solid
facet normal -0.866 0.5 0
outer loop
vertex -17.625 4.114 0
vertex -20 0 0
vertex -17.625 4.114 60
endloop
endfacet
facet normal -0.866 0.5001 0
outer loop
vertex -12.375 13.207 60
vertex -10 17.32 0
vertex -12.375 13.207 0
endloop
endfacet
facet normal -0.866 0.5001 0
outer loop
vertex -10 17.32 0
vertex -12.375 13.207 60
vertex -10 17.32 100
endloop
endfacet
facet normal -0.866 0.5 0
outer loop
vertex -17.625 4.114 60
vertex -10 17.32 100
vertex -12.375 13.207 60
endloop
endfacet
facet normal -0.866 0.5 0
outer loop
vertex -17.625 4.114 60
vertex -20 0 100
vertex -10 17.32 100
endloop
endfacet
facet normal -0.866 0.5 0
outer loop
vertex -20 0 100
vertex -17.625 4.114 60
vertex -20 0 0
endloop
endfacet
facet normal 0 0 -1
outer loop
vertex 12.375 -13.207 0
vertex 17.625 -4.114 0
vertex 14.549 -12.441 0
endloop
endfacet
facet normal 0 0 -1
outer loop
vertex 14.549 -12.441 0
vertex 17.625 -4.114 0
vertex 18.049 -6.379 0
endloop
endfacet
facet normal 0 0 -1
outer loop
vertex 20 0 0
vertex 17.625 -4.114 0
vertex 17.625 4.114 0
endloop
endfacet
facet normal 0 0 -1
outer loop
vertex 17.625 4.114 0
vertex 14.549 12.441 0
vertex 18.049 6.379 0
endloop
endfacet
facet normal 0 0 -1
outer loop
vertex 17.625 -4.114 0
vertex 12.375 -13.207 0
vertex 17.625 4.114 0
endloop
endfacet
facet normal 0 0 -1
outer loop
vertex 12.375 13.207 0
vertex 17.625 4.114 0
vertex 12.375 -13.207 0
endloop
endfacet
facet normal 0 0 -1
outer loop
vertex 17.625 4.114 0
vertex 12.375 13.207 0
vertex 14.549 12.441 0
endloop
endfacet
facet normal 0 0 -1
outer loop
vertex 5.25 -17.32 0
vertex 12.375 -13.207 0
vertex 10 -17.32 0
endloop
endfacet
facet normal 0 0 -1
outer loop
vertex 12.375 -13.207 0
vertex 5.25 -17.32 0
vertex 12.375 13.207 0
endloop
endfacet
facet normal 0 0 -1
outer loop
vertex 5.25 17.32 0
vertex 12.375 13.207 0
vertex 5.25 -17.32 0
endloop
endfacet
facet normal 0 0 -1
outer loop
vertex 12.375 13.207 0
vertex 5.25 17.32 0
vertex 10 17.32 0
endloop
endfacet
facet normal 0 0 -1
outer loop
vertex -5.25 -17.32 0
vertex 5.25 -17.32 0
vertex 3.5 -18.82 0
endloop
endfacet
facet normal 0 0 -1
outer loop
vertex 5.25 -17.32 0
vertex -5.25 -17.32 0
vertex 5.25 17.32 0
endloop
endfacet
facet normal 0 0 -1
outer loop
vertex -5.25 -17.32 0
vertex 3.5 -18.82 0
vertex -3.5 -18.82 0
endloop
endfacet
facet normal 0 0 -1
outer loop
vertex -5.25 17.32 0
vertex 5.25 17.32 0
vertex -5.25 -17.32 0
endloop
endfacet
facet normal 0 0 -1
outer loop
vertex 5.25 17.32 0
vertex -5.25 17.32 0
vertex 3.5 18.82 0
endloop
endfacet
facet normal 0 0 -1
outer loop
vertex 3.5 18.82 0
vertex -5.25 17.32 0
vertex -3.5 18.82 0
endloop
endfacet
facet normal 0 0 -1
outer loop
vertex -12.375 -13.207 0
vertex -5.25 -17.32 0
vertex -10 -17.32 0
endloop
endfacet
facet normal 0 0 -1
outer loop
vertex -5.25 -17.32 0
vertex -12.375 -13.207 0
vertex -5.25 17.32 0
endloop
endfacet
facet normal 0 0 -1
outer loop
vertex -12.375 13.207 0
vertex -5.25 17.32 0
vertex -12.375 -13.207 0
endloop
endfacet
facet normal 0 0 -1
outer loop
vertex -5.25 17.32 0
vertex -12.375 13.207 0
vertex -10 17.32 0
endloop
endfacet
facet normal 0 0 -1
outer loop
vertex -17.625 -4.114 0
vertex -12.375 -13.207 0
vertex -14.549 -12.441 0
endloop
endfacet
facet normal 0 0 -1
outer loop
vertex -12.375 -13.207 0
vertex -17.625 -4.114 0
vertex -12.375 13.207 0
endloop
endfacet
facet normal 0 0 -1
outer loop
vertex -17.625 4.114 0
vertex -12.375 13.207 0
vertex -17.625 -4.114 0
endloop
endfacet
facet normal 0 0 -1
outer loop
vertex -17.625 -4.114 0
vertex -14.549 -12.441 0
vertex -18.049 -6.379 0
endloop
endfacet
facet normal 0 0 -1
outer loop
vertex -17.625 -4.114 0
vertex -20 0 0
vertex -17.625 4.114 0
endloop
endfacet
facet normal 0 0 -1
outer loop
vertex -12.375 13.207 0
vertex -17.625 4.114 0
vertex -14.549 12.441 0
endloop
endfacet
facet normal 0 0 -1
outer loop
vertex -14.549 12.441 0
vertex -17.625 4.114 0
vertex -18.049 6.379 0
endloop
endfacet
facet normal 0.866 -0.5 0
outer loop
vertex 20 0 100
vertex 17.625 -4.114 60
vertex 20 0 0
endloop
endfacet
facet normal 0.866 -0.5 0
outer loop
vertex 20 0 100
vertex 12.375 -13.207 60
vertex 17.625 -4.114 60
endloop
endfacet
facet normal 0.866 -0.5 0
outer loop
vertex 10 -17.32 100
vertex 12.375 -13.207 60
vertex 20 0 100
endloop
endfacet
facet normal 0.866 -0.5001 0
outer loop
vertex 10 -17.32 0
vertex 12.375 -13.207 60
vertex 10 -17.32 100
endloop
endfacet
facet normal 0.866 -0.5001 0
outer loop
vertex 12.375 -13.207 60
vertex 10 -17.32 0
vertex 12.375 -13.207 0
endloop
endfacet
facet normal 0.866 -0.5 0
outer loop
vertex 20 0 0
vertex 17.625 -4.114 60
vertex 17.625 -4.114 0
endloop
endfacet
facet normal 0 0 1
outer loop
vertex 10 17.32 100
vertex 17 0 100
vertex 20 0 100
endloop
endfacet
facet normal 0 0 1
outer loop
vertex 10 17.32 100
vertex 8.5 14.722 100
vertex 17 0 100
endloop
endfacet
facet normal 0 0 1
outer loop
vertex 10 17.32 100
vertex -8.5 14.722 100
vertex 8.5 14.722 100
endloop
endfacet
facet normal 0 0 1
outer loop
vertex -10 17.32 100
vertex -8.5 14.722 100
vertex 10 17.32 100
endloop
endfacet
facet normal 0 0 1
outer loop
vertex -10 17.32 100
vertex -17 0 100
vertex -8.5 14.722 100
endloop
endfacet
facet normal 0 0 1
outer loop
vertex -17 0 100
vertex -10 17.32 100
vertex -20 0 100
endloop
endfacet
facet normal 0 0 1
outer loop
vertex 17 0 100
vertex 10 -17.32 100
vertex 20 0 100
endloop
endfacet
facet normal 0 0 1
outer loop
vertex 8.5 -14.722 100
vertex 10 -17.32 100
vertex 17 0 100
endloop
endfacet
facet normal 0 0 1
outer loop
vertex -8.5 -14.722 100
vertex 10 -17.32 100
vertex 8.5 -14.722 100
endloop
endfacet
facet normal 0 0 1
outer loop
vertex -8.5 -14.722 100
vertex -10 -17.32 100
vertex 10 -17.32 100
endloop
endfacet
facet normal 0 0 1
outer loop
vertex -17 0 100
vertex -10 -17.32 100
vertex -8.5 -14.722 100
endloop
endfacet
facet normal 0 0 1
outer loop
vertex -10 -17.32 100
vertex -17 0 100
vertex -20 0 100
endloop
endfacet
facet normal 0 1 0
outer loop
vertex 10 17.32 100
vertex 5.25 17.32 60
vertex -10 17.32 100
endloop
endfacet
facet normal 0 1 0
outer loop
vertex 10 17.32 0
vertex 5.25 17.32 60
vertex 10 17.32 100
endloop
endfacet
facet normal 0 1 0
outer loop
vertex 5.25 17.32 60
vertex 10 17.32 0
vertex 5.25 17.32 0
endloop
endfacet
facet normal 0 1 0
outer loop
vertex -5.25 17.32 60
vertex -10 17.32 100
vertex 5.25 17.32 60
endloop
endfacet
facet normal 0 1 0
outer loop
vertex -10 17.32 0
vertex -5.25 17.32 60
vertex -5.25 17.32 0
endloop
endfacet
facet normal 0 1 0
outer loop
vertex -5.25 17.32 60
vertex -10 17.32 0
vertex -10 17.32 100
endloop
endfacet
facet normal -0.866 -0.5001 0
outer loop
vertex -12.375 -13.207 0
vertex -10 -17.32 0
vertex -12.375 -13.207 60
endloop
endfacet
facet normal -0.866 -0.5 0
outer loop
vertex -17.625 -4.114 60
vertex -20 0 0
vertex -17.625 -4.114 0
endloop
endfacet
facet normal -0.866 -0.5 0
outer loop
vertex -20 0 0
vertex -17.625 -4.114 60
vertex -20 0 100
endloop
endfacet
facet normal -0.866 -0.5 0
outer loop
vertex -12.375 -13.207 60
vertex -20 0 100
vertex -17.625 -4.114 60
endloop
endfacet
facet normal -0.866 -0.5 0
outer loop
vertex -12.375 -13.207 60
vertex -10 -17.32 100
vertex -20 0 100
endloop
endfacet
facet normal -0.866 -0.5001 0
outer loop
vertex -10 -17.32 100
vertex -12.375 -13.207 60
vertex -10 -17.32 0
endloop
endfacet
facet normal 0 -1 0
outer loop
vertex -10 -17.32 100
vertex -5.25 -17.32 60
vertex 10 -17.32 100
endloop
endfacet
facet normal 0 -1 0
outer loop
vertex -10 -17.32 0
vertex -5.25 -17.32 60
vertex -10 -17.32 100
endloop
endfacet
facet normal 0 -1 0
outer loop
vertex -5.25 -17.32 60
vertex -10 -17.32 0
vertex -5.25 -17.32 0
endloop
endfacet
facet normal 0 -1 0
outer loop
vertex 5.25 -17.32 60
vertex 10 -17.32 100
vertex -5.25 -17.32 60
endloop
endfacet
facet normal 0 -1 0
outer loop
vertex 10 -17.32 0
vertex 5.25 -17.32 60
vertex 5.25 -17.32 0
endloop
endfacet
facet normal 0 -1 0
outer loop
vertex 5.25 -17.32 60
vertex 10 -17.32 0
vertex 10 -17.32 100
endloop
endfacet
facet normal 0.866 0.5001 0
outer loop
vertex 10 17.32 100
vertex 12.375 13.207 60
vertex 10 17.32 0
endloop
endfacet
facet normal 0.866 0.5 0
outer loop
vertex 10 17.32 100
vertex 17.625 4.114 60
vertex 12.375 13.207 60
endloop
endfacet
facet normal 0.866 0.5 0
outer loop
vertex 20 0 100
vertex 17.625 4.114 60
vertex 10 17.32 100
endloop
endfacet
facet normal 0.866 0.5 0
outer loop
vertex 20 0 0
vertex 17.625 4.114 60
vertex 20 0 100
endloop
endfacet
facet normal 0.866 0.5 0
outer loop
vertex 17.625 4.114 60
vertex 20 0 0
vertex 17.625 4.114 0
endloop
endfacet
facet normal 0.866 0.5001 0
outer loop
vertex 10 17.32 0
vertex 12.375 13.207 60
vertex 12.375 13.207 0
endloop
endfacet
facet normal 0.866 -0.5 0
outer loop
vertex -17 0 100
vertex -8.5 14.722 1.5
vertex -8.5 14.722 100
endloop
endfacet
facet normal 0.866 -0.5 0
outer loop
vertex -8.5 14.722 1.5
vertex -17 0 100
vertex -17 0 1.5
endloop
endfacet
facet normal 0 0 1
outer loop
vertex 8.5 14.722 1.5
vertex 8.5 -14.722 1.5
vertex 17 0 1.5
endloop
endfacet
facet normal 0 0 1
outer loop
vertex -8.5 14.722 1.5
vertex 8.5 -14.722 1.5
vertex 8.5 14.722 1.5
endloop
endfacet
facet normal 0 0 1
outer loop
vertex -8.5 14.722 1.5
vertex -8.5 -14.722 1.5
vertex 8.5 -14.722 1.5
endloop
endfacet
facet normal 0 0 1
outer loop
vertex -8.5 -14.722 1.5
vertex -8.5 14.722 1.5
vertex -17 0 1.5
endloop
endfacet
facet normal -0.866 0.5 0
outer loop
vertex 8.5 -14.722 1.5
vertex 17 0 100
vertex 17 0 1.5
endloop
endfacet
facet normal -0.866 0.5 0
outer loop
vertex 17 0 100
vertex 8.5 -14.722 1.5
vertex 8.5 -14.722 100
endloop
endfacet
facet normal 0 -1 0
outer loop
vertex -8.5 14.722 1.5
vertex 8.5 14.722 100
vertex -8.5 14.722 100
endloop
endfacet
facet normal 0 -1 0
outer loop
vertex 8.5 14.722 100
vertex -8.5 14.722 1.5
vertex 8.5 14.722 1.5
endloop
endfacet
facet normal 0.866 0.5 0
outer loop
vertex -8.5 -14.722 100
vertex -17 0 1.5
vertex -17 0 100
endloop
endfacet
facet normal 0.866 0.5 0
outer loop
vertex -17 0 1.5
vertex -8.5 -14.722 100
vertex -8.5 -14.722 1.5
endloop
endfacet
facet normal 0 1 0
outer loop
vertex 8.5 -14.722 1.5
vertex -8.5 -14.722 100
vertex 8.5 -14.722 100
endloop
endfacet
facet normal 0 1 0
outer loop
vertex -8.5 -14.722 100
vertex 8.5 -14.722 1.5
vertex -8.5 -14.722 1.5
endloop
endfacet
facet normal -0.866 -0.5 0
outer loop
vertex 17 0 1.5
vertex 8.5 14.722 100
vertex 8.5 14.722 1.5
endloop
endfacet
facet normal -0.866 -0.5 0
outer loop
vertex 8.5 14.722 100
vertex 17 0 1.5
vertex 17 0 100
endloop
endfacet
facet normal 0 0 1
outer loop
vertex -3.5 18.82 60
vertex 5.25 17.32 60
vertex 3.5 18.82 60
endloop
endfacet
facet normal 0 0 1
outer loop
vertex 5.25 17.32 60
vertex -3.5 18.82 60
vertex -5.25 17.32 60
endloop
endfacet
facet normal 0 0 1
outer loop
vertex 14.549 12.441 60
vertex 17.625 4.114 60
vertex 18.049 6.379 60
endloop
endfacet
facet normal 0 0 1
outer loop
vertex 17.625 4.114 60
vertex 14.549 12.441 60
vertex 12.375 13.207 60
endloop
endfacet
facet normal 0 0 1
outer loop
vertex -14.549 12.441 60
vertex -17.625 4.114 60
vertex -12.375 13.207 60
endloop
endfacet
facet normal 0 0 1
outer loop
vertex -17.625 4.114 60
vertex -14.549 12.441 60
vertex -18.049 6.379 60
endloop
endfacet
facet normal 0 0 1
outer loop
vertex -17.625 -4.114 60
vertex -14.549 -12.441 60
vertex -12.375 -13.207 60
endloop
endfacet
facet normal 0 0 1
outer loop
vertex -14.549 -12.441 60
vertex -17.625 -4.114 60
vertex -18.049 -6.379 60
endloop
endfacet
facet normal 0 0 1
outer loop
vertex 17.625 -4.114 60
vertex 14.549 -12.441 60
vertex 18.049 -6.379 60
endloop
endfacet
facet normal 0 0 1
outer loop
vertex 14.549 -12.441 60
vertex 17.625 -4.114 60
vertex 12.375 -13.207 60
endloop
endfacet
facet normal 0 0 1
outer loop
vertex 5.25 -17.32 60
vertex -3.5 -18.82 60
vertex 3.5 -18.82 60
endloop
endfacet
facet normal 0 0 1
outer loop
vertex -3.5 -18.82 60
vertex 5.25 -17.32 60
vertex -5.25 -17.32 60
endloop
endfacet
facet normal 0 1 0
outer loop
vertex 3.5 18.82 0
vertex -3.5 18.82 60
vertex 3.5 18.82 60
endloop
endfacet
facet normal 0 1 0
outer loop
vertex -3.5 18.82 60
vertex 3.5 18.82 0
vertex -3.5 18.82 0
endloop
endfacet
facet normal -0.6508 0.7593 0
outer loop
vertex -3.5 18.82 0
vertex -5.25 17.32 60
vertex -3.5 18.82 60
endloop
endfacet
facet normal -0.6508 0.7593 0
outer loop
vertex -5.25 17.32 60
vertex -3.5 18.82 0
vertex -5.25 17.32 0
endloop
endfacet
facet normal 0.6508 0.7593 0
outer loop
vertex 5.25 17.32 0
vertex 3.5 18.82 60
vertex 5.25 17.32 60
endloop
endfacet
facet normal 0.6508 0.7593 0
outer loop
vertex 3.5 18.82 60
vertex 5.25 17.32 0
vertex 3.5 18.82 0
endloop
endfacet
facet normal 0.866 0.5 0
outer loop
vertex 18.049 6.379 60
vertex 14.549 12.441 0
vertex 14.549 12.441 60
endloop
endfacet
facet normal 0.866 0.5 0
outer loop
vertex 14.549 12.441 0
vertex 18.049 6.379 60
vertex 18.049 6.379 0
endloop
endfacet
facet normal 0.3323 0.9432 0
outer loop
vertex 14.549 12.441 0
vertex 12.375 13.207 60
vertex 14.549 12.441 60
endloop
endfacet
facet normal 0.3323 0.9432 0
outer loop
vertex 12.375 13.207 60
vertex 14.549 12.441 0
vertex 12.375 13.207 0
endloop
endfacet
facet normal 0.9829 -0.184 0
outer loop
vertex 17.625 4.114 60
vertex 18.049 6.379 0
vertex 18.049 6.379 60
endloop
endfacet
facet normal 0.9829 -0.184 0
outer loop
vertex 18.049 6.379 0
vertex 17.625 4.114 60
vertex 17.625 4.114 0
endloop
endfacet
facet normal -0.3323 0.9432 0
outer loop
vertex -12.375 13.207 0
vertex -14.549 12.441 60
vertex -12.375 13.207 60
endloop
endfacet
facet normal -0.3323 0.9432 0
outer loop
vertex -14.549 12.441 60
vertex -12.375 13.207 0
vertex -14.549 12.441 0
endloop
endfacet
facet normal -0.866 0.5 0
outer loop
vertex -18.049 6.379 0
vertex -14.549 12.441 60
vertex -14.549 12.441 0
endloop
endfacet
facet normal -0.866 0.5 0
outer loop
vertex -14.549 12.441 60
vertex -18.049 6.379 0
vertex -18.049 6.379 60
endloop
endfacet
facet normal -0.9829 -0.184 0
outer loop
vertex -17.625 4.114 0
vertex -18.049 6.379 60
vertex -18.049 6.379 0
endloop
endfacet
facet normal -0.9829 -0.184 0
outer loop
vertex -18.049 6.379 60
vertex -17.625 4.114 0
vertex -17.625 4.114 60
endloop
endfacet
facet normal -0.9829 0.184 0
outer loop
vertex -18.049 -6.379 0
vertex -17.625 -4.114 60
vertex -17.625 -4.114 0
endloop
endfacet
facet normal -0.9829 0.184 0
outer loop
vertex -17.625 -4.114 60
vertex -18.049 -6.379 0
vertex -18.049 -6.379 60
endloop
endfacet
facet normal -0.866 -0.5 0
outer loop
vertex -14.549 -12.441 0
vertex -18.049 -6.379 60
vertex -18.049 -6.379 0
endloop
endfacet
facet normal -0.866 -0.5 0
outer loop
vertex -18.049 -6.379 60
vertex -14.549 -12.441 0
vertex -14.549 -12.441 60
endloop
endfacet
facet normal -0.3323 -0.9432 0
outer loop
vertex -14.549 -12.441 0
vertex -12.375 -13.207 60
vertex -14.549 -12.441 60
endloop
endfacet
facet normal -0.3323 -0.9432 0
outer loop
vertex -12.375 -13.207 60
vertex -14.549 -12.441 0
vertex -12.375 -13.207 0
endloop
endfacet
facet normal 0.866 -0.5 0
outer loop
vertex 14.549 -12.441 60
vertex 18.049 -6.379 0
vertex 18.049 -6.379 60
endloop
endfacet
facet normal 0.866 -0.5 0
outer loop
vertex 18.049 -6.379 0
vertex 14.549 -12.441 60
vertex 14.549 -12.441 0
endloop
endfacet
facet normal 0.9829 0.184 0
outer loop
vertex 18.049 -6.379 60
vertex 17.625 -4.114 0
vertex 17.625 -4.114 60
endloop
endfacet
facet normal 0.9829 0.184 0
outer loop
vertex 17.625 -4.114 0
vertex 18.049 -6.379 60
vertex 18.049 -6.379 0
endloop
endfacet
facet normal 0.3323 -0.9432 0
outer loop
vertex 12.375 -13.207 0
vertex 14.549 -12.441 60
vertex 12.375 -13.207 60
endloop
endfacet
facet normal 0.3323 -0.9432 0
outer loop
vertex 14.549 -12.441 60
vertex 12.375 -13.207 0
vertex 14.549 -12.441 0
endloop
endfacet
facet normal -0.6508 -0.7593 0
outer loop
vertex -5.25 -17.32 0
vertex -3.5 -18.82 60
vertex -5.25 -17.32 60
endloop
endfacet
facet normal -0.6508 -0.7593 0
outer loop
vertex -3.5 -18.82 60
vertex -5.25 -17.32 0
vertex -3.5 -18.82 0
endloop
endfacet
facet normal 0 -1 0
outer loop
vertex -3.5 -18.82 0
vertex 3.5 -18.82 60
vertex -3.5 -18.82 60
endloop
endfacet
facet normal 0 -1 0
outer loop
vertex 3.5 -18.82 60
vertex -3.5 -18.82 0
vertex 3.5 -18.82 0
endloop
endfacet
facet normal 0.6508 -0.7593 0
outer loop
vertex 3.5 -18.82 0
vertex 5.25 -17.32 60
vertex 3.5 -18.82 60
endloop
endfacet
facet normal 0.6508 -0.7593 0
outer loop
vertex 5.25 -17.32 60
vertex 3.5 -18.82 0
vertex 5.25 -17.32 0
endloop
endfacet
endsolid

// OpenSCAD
module trapezoid(b, t, h) {
    polygon(points=[
        [-b/2, -h/2],
        [+b/2, -h/2],
        [+t/2, +h/2],
        [-t/2, +h/2]
    ]);
}

module hexagon(side) {
    r = side;  // for a regular hexagon
    points = [for (i = [0:5]) [r * cos(i * 60), r * sin(i * 60)]];
    polygon(points);
}

// Put trapezoid on each side of a hexagon
module hex_with_trapezoids(hex_side, trap_base, trap_top, trap_height) {
    r = hex_side;  // For regular hexagon: side = radius to vertex
    points = [for (i = [0:5]) [r * cos(i * 60), r * sin(i * 60)]];

    for (i = [0:5]) {
        p1 = points[i];
        p2 = points[(i + 1) % 6];

        center = [ (p1[0] + p2[0]) / 2, (p1[1] + p2[1]) / 2 ];

        // Angle between p2 and p1 from the x-xis
        angle = atan2(p2[1] - p1[1], p2[0] - p1[0]);

        // Place and rotate the trapezoid
        translate(center)
            rotate(angle)
                trapezoid(trap_base, trap_top, trap_height);
    }
}

fatness = 40;
top_inner = 20;
wall_thickness = 1.5;
base_thickness = 3;

cutout_inner = 14;
cutout_outer = 7;

min_height = 60;
max_height = 100;

difference () {
    // Center container is a hexagonal shape with side length: top_inner
    linear_extrude(max_height)
        hexagon(top_inner);
    
    translate([0, 0, wall_thickness]){
        linear_extrude(max_height)
            hexagon(top_inner - 2 * wall_thickness);
    }
}

linear_extrude(min_height)
hex_with_trapezoids(
    hex_side = top_inner,
    trap_base = cutout_outer,
    trap_top = cutout_inner,
    trap_height = wall_thickness * 2
);
